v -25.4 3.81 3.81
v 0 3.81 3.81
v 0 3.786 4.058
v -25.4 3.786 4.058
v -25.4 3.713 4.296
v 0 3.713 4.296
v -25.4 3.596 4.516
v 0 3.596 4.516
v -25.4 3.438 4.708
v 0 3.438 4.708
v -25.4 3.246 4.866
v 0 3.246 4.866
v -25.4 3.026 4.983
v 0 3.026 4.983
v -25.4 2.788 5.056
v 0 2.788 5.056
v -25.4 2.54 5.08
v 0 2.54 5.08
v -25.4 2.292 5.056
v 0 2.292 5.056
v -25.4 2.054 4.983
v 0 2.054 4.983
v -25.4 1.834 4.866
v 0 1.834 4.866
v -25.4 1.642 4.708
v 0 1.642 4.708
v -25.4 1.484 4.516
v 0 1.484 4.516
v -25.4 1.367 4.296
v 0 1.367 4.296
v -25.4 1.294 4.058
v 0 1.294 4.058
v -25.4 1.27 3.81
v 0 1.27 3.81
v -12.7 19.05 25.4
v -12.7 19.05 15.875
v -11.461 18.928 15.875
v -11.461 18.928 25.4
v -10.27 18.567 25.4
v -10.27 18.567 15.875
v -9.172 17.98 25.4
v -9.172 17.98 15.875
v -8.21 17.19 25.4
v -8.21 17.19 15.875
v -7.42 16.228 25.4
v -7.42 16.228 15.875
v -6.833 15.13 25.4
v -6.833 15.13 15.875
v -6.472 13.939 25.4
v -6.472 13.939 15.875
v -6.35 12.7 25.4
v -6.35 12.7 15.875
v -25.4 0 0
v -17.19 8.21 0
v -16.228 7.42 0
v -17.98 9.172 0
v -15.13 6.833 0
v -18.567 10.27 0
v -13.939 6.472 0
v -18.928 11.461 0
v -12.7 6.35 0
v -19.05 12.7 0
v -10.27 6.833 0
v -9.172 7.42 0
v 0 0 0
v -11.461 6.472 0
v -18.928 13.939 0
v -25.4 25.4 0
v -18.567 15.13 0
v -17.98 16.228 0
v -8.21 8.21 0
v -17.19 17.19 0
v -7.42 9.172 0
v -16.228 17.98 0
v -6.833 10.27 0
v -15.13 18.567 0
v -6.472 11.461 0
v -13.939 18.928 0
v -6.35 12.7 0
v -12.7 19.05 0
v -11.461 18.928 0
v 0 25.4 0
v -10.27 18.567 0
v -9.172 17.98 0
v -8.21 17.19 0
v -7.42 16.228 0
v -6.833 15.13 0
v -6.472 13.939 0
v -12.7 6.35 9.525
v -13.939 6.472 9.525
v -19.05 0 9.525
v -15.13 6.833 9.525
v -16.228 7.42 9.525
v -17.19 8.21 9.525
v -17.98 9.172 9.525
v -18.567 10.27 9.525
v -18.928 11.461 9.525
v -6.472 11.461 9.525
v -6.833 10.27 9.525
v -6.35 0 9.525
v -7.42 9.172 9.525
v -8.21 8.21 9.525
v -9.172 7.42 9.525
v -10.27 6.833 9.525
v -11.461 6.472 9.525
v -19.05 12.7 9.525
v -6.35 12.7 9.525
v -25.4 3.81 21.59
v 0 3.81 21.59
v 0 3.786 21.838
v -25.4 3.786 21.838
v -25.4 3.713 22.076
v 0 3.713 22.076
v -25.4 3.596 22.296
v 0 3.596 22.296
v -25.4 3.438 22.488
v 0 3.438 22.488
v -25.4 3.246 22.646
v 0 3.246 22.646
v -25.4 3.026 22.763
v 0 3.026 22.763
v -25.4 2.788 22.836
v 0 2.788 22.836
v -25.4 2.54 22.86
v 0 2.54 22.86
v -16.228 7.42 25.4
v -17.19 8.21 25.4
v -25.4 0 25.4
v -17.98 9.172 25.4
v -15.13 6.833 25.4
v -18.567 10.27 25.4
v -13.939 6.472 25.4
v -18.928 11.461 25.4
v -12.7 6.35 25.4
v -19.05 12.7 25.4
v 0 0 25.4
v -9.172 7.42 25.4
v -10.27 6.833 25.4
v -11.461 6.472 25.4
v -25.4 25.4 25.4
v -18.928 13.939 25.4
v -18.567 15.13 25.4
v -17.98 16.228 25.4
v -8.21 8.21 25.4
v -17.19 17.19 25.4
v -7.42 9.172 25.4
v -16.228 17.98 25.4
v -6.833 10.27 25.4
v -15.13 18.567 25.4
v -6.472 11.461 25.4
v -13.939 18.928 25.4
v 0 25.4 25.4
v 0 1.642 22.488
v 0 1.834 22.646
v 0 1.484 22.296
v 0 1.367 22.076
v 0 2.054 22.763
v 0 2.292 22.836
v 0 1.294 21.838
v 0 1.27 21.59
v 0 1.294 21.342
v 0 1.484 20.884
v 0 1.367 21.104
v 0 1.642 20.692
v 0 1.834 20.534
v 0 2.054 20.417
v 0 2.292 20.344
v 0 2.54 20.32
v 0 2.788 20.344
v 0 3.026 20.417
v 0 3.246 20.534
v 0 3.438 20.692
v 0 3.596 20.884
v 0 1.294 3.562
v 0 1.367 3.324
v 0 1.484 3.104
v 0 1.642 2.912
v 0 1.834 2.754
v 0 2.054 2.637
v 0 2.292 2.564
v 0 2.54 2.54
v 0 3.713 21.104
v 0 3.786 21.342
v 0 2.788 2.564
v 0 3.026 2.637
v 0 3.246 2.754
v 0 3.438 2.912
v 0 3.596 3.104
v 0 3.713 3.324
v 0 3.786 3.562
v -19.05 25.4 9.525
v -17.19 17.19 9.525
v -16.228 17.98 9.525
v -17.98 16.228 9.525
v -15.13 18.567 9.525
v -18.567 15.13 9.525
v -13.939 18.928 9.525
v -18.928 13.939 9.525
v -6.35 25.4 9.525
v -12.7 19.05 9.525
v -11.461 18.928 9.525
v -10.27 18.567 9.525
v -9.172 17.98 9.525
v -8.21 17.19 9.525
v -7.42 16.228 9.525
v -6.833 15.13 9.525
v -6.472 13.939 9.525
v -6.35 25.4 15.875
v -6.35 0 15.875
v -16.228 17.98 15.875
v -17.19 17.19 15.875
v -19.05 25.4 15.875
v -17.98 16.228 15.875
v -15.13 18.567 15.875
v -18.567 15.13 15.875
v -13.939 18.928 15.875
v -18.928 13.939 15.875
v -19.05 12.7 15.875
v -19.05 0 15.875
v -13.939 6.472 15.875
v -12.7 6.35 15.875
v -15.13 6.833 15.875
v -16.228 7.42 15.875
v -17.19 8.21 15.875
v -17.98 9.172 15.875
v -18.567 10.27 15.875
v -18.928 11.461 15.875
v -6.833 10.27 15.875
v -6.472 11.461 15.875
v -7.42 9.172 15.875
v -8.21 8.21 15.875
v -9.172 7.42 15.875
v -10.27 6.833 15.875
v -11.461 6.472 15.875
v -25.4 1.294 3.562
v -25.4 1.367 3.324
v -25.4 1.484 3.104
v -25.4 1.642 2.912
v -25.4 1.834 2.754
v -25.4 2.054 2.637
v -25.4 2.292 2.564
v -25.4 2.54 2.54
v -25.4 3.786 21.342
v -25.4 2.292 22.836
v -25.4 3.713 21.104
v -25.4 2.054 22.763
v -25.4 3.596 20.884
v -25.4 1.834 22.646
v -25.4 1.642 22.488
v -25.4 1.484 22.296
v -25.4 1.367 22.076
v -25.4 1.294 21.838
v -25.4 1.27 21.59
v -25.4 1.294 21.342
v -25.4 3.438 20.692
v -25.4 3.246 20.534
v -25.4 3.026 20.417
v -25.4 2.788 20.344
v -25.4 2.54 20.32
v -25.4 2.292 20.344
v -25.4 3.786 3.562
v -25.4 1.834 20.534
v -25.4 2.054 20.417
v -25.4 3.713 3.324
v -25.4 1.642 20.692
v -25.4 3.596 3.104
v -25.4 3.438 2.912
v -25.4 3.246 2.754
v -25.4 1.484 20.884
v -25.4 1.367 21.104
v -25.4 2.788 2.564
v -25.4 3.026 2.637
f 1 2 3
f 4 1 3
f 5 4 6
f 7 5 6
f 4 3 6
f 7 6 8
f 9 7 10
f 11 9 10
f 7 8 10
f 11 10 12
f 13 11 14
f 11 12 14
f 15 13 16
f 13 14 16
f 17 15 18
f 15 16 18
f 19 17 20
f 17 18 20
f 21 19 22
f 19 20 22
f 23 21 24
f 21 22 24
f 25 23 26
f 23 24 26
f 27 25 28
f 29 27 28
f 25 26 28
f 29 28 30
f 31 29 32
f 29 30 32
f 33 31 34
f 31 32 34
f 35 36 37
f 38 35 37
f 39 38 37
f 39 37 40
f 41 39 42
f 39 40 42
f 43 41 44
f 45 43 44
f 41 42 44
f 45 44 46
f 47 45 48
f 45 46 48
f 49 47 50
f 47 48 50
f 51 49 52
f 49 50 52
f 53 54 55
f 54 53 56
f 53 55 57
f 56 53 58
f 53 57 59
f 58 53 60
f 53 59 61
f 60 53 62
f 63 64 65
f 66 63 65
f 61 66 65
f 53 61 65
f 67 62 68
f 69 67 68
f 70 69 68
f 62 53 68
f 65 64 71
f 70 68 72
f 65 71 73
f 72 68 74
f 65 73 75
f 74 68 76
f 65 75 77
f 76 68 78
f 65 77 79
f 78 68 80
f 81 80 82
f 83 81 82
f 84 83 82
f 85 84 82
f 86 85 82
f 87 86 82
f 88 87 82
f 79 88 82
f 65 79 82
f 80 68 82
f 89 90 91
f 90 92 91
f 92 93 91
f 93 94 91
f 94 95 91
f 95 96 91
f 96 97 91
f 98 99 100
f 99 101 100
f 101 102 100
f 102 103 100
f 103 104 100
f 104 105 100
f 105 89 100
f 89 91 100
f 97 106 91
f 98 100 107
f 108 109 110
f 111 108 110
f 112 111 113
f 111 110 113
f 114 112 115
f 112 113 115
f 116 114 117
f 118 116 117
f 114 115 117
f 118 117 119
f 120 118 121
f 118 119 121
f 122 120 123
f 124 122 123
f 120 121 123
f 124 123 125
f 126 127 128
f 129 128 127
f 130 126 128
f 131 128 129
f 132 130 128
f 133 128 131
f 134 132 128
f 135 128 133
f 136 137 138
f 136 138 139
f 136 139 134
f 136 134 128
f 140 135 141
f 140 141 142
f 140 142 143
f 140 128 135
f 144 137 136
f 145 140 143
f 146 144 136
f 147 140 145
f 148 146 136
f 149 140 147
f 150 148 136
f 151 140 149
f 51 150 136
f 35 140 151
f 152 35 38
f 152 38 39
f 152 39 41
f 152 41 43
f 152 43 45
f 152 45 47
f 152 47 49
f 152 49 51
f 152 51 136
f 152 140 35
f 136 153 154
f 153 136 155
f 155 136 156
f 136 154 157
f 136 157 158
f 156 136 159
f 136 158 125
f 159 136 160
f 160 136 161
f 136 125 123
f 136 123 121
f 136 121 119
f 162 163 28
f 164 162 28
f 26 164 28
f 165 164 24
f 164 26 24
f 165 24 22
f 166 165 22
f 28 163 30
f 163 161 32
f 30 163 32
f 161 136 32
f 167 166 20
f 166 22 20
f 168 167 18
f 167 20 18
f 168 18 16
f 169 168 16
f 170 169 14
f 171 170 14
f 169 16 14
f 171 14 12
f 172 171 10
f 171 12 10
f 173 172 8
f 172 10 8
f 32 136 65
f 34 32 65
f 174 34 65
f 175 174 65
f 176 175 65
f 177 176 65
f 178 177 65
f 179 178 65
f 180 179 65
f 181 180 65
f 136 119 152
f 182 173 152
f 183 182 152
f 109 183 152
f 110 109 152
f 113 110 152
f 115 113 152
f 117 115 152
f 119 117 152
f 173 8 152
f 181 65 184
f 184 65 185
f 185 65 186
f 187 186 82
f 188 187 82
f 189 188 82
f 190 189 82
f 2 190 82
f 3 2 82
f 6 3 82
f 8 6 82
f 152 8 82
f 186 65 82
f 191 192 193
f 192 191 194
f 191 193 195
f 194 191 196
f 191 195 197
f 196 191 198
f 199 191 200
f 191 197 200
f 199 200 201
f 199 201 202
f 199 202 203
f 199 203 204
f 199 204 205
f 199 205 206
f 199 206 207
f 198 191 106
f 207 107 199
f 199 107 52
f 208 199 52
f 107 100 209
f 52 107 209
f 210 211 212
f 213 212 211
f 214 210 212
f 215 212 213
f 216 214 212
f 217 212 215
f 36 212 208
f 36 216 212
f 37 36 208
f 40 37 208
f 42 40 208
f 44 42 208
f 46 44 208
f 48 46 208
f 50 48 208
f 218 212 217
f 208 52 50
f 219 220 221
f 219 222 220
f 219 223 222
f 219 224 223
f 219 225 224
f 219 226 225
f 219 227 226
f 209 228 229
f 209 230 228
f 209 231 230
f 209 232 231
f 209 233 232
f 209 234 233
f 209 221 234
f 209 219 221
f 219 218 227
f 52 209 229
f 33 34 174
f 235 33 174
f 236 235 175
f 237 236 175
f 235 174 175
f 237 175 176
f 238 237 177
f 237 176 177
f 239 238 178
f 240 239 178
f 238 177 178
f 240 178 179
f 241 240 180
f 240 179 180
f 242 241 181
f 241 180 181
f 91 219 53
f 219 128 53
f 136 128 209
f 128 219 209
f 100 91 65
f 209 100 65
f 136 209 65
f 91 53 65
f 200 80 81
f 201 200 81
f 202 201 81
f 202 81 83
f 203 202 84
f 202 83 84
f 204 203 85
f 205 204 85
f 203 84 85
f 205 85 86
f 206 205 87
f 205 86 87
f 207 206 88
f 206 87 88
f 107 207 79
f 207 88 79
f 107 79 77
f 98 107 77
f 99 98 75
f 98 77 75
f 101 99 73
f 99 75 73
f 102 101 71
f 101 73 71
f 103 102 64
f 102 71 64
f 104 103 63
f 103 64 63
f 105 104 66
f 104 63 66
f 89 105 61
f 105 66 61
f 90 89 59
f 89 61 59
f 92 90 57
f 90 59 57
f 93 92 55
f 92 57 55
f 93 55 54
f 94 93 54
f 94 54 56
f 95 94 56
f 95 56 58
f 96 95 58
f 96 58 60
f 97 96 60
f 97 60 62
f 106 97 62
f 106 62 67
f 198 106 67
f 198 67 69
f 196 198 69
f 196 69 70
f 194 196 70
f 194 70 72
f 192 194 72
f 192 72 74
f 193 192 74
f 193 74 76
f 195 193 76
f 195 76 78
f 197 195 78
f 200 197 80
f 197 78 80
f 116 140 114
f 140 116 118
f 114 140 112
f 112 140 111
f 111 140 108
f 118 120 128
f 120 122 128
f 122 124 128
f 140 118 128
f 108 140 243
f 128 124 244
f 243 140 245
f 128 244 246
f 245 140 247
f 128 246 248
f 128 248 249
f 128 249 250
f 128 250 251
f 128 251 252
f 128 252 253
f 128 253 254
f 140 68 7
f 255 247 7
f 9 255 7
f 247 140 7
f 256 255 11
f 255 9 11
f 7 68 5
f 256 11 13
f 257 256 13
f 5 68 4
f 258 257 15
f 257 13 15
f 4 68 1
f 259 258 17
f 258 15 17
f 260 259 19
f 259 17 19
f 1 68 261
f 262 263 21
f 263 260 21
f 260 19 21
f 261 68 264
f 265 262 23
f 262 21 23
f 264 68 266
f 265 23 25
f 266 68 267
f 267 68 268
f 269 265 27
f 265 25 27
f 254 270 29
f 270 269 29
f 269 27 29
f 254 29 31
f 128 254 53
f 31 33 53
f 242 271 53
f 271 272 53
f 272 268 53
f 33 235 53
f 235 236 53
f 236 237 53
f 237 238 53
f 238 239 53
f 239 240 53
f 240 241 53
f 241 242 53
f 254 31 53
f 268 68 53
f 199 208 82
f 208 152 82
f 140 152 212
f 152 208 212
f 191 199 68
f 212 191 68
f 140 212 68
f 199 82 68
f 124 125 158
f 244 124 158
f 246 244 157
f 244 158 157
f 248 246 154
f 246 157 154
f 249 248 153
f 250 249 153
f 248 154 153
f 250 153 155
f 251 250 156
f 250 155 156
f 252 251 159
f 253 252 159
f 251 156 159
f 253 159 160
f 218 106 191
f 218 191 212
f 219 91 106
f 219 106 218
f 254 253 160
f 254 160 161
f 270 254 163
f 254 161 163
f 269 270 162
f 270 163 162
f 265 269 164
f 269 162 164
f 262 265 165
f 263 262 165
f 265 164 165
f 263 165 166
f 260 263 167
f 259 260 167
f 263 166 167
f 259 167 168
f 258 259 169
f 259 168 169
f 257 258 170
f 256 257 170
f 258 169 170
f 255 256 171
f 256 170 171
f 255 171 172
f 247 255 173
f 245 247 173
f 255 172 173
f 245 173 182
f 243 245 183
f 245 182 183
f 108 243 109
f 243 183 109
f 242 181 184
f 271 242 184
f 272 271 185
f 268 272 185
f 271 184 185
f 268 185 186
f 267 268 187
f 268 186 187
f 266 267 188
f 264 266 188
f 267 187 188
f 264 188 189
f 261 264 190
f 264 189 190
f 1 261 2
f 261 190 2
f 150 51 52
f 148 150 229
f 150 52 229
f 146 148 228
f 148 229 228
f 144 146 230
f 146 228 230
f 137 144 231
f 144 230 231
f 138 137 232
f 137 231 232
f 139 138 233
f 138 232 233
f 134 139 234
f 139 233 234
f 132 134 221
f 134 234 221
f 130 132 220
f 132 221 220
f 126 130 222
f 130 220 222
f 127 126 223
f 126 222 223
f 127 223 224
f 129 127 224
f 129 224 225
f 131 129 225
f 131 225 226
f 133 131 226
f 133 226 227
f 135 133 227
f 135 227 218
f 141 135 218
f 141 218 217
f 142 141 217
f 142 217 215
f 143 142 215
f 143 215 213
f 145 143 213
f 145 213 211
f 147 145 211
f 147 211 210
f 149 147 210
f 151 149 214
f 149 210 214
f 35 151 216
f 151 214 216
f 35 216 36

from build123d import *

# Parameters (mm, degrees)
F1_DEPTH = 25.4
F2_W     = 12.7
F2_H     = 6.35
F3_DEPTH = 25.4
F5_DEPTH = 25.4


# Not quite as in the source:
# - a feature names something its author has since deleted; it is built from what else it names


with BuildPart() as f1:
    # F0 (on Top) → F1 (new body)
    with BuildSketch(Plane.XY):
        Polygon((-3.81, 0), (0, 0), (0, 2.54), (0, 25.4), (-12.7, 25.4), (-25.4, 25.4), (-25.4, 2.54), (-25.4, 0), (-21.59, 0), align=None)
        with BuildLine():
            ThreePointArc((-6.35, 12.7), (-17.1901280605, 8.2098719395), (-12.7, 19.05))
            ThreePointArc((-12.7, 19.05), (-8.2098719395, 17.1901280605), (-6.35, 12.7))
        make_face(mode=Mode.SUBTRACT)
    extrude(amount=F1_DEPTH)

    # F2 (on face) → F3 (cut)
    with BuildSketch(Plane.XZ):
        with Locations((-12.7, 12.7)):
            Rectangle(F2_W, F2_H)
    extrude(amount=-F3_DEPTH, mode=Mode.SUBTRACT)

    # F4 (on face) → F5 (cut)
    with BuildSketch(Plane.YZ):
        with BuildLine():
            ThreePointArc((3.81, 21.59), (3.4380256121, 22.4880256121), (2.54, 22.86))
            Line((2.54, 22.86), (2.54, 21.59))
            Line((2.54, 21.59), (1.27, 21.59))
            ThreePointArc((1.27, 21.59), (2.54, 20.32), (3.81, 21.59))
        make_face()
        with BuildLine():
            Line((2.54, 21.59), (2.54, 22.86))
            ThreePointArc((2.54, 22.86), (1.6419743879, 22.4880256121), (1.27, 21.59))
            Line((1.27, 21.59), (2.54, 21.59))
        make_face()
        with BuildLine():
            ThreePointArc((3.81, 3.81), (2.54, 5.08), (1.27, 3.81))
            Line((1.27, 3.81), (2.54, 3.81))
            Line((2.54, 3.81), (2.54, 2.54))
            ThreePointArc((2.54, 2.54), (3.4380256121, 2.9119743879), (3.81, 3.81))
        make_face()
        with BuildLine():
            Line((2.54, 3.81), (1.27, 3.81))
            ThreePointArc((1.27, 3.81), (1.6419743879, 2.9119743879), (2.54, 2.54))
            Line((2.54, 2.54), (2.54, 3.81))
        make_face()
    extrude(amount=-F5_DEPTH, mode=Mode.SUBTRACT)


solid = f1.part
